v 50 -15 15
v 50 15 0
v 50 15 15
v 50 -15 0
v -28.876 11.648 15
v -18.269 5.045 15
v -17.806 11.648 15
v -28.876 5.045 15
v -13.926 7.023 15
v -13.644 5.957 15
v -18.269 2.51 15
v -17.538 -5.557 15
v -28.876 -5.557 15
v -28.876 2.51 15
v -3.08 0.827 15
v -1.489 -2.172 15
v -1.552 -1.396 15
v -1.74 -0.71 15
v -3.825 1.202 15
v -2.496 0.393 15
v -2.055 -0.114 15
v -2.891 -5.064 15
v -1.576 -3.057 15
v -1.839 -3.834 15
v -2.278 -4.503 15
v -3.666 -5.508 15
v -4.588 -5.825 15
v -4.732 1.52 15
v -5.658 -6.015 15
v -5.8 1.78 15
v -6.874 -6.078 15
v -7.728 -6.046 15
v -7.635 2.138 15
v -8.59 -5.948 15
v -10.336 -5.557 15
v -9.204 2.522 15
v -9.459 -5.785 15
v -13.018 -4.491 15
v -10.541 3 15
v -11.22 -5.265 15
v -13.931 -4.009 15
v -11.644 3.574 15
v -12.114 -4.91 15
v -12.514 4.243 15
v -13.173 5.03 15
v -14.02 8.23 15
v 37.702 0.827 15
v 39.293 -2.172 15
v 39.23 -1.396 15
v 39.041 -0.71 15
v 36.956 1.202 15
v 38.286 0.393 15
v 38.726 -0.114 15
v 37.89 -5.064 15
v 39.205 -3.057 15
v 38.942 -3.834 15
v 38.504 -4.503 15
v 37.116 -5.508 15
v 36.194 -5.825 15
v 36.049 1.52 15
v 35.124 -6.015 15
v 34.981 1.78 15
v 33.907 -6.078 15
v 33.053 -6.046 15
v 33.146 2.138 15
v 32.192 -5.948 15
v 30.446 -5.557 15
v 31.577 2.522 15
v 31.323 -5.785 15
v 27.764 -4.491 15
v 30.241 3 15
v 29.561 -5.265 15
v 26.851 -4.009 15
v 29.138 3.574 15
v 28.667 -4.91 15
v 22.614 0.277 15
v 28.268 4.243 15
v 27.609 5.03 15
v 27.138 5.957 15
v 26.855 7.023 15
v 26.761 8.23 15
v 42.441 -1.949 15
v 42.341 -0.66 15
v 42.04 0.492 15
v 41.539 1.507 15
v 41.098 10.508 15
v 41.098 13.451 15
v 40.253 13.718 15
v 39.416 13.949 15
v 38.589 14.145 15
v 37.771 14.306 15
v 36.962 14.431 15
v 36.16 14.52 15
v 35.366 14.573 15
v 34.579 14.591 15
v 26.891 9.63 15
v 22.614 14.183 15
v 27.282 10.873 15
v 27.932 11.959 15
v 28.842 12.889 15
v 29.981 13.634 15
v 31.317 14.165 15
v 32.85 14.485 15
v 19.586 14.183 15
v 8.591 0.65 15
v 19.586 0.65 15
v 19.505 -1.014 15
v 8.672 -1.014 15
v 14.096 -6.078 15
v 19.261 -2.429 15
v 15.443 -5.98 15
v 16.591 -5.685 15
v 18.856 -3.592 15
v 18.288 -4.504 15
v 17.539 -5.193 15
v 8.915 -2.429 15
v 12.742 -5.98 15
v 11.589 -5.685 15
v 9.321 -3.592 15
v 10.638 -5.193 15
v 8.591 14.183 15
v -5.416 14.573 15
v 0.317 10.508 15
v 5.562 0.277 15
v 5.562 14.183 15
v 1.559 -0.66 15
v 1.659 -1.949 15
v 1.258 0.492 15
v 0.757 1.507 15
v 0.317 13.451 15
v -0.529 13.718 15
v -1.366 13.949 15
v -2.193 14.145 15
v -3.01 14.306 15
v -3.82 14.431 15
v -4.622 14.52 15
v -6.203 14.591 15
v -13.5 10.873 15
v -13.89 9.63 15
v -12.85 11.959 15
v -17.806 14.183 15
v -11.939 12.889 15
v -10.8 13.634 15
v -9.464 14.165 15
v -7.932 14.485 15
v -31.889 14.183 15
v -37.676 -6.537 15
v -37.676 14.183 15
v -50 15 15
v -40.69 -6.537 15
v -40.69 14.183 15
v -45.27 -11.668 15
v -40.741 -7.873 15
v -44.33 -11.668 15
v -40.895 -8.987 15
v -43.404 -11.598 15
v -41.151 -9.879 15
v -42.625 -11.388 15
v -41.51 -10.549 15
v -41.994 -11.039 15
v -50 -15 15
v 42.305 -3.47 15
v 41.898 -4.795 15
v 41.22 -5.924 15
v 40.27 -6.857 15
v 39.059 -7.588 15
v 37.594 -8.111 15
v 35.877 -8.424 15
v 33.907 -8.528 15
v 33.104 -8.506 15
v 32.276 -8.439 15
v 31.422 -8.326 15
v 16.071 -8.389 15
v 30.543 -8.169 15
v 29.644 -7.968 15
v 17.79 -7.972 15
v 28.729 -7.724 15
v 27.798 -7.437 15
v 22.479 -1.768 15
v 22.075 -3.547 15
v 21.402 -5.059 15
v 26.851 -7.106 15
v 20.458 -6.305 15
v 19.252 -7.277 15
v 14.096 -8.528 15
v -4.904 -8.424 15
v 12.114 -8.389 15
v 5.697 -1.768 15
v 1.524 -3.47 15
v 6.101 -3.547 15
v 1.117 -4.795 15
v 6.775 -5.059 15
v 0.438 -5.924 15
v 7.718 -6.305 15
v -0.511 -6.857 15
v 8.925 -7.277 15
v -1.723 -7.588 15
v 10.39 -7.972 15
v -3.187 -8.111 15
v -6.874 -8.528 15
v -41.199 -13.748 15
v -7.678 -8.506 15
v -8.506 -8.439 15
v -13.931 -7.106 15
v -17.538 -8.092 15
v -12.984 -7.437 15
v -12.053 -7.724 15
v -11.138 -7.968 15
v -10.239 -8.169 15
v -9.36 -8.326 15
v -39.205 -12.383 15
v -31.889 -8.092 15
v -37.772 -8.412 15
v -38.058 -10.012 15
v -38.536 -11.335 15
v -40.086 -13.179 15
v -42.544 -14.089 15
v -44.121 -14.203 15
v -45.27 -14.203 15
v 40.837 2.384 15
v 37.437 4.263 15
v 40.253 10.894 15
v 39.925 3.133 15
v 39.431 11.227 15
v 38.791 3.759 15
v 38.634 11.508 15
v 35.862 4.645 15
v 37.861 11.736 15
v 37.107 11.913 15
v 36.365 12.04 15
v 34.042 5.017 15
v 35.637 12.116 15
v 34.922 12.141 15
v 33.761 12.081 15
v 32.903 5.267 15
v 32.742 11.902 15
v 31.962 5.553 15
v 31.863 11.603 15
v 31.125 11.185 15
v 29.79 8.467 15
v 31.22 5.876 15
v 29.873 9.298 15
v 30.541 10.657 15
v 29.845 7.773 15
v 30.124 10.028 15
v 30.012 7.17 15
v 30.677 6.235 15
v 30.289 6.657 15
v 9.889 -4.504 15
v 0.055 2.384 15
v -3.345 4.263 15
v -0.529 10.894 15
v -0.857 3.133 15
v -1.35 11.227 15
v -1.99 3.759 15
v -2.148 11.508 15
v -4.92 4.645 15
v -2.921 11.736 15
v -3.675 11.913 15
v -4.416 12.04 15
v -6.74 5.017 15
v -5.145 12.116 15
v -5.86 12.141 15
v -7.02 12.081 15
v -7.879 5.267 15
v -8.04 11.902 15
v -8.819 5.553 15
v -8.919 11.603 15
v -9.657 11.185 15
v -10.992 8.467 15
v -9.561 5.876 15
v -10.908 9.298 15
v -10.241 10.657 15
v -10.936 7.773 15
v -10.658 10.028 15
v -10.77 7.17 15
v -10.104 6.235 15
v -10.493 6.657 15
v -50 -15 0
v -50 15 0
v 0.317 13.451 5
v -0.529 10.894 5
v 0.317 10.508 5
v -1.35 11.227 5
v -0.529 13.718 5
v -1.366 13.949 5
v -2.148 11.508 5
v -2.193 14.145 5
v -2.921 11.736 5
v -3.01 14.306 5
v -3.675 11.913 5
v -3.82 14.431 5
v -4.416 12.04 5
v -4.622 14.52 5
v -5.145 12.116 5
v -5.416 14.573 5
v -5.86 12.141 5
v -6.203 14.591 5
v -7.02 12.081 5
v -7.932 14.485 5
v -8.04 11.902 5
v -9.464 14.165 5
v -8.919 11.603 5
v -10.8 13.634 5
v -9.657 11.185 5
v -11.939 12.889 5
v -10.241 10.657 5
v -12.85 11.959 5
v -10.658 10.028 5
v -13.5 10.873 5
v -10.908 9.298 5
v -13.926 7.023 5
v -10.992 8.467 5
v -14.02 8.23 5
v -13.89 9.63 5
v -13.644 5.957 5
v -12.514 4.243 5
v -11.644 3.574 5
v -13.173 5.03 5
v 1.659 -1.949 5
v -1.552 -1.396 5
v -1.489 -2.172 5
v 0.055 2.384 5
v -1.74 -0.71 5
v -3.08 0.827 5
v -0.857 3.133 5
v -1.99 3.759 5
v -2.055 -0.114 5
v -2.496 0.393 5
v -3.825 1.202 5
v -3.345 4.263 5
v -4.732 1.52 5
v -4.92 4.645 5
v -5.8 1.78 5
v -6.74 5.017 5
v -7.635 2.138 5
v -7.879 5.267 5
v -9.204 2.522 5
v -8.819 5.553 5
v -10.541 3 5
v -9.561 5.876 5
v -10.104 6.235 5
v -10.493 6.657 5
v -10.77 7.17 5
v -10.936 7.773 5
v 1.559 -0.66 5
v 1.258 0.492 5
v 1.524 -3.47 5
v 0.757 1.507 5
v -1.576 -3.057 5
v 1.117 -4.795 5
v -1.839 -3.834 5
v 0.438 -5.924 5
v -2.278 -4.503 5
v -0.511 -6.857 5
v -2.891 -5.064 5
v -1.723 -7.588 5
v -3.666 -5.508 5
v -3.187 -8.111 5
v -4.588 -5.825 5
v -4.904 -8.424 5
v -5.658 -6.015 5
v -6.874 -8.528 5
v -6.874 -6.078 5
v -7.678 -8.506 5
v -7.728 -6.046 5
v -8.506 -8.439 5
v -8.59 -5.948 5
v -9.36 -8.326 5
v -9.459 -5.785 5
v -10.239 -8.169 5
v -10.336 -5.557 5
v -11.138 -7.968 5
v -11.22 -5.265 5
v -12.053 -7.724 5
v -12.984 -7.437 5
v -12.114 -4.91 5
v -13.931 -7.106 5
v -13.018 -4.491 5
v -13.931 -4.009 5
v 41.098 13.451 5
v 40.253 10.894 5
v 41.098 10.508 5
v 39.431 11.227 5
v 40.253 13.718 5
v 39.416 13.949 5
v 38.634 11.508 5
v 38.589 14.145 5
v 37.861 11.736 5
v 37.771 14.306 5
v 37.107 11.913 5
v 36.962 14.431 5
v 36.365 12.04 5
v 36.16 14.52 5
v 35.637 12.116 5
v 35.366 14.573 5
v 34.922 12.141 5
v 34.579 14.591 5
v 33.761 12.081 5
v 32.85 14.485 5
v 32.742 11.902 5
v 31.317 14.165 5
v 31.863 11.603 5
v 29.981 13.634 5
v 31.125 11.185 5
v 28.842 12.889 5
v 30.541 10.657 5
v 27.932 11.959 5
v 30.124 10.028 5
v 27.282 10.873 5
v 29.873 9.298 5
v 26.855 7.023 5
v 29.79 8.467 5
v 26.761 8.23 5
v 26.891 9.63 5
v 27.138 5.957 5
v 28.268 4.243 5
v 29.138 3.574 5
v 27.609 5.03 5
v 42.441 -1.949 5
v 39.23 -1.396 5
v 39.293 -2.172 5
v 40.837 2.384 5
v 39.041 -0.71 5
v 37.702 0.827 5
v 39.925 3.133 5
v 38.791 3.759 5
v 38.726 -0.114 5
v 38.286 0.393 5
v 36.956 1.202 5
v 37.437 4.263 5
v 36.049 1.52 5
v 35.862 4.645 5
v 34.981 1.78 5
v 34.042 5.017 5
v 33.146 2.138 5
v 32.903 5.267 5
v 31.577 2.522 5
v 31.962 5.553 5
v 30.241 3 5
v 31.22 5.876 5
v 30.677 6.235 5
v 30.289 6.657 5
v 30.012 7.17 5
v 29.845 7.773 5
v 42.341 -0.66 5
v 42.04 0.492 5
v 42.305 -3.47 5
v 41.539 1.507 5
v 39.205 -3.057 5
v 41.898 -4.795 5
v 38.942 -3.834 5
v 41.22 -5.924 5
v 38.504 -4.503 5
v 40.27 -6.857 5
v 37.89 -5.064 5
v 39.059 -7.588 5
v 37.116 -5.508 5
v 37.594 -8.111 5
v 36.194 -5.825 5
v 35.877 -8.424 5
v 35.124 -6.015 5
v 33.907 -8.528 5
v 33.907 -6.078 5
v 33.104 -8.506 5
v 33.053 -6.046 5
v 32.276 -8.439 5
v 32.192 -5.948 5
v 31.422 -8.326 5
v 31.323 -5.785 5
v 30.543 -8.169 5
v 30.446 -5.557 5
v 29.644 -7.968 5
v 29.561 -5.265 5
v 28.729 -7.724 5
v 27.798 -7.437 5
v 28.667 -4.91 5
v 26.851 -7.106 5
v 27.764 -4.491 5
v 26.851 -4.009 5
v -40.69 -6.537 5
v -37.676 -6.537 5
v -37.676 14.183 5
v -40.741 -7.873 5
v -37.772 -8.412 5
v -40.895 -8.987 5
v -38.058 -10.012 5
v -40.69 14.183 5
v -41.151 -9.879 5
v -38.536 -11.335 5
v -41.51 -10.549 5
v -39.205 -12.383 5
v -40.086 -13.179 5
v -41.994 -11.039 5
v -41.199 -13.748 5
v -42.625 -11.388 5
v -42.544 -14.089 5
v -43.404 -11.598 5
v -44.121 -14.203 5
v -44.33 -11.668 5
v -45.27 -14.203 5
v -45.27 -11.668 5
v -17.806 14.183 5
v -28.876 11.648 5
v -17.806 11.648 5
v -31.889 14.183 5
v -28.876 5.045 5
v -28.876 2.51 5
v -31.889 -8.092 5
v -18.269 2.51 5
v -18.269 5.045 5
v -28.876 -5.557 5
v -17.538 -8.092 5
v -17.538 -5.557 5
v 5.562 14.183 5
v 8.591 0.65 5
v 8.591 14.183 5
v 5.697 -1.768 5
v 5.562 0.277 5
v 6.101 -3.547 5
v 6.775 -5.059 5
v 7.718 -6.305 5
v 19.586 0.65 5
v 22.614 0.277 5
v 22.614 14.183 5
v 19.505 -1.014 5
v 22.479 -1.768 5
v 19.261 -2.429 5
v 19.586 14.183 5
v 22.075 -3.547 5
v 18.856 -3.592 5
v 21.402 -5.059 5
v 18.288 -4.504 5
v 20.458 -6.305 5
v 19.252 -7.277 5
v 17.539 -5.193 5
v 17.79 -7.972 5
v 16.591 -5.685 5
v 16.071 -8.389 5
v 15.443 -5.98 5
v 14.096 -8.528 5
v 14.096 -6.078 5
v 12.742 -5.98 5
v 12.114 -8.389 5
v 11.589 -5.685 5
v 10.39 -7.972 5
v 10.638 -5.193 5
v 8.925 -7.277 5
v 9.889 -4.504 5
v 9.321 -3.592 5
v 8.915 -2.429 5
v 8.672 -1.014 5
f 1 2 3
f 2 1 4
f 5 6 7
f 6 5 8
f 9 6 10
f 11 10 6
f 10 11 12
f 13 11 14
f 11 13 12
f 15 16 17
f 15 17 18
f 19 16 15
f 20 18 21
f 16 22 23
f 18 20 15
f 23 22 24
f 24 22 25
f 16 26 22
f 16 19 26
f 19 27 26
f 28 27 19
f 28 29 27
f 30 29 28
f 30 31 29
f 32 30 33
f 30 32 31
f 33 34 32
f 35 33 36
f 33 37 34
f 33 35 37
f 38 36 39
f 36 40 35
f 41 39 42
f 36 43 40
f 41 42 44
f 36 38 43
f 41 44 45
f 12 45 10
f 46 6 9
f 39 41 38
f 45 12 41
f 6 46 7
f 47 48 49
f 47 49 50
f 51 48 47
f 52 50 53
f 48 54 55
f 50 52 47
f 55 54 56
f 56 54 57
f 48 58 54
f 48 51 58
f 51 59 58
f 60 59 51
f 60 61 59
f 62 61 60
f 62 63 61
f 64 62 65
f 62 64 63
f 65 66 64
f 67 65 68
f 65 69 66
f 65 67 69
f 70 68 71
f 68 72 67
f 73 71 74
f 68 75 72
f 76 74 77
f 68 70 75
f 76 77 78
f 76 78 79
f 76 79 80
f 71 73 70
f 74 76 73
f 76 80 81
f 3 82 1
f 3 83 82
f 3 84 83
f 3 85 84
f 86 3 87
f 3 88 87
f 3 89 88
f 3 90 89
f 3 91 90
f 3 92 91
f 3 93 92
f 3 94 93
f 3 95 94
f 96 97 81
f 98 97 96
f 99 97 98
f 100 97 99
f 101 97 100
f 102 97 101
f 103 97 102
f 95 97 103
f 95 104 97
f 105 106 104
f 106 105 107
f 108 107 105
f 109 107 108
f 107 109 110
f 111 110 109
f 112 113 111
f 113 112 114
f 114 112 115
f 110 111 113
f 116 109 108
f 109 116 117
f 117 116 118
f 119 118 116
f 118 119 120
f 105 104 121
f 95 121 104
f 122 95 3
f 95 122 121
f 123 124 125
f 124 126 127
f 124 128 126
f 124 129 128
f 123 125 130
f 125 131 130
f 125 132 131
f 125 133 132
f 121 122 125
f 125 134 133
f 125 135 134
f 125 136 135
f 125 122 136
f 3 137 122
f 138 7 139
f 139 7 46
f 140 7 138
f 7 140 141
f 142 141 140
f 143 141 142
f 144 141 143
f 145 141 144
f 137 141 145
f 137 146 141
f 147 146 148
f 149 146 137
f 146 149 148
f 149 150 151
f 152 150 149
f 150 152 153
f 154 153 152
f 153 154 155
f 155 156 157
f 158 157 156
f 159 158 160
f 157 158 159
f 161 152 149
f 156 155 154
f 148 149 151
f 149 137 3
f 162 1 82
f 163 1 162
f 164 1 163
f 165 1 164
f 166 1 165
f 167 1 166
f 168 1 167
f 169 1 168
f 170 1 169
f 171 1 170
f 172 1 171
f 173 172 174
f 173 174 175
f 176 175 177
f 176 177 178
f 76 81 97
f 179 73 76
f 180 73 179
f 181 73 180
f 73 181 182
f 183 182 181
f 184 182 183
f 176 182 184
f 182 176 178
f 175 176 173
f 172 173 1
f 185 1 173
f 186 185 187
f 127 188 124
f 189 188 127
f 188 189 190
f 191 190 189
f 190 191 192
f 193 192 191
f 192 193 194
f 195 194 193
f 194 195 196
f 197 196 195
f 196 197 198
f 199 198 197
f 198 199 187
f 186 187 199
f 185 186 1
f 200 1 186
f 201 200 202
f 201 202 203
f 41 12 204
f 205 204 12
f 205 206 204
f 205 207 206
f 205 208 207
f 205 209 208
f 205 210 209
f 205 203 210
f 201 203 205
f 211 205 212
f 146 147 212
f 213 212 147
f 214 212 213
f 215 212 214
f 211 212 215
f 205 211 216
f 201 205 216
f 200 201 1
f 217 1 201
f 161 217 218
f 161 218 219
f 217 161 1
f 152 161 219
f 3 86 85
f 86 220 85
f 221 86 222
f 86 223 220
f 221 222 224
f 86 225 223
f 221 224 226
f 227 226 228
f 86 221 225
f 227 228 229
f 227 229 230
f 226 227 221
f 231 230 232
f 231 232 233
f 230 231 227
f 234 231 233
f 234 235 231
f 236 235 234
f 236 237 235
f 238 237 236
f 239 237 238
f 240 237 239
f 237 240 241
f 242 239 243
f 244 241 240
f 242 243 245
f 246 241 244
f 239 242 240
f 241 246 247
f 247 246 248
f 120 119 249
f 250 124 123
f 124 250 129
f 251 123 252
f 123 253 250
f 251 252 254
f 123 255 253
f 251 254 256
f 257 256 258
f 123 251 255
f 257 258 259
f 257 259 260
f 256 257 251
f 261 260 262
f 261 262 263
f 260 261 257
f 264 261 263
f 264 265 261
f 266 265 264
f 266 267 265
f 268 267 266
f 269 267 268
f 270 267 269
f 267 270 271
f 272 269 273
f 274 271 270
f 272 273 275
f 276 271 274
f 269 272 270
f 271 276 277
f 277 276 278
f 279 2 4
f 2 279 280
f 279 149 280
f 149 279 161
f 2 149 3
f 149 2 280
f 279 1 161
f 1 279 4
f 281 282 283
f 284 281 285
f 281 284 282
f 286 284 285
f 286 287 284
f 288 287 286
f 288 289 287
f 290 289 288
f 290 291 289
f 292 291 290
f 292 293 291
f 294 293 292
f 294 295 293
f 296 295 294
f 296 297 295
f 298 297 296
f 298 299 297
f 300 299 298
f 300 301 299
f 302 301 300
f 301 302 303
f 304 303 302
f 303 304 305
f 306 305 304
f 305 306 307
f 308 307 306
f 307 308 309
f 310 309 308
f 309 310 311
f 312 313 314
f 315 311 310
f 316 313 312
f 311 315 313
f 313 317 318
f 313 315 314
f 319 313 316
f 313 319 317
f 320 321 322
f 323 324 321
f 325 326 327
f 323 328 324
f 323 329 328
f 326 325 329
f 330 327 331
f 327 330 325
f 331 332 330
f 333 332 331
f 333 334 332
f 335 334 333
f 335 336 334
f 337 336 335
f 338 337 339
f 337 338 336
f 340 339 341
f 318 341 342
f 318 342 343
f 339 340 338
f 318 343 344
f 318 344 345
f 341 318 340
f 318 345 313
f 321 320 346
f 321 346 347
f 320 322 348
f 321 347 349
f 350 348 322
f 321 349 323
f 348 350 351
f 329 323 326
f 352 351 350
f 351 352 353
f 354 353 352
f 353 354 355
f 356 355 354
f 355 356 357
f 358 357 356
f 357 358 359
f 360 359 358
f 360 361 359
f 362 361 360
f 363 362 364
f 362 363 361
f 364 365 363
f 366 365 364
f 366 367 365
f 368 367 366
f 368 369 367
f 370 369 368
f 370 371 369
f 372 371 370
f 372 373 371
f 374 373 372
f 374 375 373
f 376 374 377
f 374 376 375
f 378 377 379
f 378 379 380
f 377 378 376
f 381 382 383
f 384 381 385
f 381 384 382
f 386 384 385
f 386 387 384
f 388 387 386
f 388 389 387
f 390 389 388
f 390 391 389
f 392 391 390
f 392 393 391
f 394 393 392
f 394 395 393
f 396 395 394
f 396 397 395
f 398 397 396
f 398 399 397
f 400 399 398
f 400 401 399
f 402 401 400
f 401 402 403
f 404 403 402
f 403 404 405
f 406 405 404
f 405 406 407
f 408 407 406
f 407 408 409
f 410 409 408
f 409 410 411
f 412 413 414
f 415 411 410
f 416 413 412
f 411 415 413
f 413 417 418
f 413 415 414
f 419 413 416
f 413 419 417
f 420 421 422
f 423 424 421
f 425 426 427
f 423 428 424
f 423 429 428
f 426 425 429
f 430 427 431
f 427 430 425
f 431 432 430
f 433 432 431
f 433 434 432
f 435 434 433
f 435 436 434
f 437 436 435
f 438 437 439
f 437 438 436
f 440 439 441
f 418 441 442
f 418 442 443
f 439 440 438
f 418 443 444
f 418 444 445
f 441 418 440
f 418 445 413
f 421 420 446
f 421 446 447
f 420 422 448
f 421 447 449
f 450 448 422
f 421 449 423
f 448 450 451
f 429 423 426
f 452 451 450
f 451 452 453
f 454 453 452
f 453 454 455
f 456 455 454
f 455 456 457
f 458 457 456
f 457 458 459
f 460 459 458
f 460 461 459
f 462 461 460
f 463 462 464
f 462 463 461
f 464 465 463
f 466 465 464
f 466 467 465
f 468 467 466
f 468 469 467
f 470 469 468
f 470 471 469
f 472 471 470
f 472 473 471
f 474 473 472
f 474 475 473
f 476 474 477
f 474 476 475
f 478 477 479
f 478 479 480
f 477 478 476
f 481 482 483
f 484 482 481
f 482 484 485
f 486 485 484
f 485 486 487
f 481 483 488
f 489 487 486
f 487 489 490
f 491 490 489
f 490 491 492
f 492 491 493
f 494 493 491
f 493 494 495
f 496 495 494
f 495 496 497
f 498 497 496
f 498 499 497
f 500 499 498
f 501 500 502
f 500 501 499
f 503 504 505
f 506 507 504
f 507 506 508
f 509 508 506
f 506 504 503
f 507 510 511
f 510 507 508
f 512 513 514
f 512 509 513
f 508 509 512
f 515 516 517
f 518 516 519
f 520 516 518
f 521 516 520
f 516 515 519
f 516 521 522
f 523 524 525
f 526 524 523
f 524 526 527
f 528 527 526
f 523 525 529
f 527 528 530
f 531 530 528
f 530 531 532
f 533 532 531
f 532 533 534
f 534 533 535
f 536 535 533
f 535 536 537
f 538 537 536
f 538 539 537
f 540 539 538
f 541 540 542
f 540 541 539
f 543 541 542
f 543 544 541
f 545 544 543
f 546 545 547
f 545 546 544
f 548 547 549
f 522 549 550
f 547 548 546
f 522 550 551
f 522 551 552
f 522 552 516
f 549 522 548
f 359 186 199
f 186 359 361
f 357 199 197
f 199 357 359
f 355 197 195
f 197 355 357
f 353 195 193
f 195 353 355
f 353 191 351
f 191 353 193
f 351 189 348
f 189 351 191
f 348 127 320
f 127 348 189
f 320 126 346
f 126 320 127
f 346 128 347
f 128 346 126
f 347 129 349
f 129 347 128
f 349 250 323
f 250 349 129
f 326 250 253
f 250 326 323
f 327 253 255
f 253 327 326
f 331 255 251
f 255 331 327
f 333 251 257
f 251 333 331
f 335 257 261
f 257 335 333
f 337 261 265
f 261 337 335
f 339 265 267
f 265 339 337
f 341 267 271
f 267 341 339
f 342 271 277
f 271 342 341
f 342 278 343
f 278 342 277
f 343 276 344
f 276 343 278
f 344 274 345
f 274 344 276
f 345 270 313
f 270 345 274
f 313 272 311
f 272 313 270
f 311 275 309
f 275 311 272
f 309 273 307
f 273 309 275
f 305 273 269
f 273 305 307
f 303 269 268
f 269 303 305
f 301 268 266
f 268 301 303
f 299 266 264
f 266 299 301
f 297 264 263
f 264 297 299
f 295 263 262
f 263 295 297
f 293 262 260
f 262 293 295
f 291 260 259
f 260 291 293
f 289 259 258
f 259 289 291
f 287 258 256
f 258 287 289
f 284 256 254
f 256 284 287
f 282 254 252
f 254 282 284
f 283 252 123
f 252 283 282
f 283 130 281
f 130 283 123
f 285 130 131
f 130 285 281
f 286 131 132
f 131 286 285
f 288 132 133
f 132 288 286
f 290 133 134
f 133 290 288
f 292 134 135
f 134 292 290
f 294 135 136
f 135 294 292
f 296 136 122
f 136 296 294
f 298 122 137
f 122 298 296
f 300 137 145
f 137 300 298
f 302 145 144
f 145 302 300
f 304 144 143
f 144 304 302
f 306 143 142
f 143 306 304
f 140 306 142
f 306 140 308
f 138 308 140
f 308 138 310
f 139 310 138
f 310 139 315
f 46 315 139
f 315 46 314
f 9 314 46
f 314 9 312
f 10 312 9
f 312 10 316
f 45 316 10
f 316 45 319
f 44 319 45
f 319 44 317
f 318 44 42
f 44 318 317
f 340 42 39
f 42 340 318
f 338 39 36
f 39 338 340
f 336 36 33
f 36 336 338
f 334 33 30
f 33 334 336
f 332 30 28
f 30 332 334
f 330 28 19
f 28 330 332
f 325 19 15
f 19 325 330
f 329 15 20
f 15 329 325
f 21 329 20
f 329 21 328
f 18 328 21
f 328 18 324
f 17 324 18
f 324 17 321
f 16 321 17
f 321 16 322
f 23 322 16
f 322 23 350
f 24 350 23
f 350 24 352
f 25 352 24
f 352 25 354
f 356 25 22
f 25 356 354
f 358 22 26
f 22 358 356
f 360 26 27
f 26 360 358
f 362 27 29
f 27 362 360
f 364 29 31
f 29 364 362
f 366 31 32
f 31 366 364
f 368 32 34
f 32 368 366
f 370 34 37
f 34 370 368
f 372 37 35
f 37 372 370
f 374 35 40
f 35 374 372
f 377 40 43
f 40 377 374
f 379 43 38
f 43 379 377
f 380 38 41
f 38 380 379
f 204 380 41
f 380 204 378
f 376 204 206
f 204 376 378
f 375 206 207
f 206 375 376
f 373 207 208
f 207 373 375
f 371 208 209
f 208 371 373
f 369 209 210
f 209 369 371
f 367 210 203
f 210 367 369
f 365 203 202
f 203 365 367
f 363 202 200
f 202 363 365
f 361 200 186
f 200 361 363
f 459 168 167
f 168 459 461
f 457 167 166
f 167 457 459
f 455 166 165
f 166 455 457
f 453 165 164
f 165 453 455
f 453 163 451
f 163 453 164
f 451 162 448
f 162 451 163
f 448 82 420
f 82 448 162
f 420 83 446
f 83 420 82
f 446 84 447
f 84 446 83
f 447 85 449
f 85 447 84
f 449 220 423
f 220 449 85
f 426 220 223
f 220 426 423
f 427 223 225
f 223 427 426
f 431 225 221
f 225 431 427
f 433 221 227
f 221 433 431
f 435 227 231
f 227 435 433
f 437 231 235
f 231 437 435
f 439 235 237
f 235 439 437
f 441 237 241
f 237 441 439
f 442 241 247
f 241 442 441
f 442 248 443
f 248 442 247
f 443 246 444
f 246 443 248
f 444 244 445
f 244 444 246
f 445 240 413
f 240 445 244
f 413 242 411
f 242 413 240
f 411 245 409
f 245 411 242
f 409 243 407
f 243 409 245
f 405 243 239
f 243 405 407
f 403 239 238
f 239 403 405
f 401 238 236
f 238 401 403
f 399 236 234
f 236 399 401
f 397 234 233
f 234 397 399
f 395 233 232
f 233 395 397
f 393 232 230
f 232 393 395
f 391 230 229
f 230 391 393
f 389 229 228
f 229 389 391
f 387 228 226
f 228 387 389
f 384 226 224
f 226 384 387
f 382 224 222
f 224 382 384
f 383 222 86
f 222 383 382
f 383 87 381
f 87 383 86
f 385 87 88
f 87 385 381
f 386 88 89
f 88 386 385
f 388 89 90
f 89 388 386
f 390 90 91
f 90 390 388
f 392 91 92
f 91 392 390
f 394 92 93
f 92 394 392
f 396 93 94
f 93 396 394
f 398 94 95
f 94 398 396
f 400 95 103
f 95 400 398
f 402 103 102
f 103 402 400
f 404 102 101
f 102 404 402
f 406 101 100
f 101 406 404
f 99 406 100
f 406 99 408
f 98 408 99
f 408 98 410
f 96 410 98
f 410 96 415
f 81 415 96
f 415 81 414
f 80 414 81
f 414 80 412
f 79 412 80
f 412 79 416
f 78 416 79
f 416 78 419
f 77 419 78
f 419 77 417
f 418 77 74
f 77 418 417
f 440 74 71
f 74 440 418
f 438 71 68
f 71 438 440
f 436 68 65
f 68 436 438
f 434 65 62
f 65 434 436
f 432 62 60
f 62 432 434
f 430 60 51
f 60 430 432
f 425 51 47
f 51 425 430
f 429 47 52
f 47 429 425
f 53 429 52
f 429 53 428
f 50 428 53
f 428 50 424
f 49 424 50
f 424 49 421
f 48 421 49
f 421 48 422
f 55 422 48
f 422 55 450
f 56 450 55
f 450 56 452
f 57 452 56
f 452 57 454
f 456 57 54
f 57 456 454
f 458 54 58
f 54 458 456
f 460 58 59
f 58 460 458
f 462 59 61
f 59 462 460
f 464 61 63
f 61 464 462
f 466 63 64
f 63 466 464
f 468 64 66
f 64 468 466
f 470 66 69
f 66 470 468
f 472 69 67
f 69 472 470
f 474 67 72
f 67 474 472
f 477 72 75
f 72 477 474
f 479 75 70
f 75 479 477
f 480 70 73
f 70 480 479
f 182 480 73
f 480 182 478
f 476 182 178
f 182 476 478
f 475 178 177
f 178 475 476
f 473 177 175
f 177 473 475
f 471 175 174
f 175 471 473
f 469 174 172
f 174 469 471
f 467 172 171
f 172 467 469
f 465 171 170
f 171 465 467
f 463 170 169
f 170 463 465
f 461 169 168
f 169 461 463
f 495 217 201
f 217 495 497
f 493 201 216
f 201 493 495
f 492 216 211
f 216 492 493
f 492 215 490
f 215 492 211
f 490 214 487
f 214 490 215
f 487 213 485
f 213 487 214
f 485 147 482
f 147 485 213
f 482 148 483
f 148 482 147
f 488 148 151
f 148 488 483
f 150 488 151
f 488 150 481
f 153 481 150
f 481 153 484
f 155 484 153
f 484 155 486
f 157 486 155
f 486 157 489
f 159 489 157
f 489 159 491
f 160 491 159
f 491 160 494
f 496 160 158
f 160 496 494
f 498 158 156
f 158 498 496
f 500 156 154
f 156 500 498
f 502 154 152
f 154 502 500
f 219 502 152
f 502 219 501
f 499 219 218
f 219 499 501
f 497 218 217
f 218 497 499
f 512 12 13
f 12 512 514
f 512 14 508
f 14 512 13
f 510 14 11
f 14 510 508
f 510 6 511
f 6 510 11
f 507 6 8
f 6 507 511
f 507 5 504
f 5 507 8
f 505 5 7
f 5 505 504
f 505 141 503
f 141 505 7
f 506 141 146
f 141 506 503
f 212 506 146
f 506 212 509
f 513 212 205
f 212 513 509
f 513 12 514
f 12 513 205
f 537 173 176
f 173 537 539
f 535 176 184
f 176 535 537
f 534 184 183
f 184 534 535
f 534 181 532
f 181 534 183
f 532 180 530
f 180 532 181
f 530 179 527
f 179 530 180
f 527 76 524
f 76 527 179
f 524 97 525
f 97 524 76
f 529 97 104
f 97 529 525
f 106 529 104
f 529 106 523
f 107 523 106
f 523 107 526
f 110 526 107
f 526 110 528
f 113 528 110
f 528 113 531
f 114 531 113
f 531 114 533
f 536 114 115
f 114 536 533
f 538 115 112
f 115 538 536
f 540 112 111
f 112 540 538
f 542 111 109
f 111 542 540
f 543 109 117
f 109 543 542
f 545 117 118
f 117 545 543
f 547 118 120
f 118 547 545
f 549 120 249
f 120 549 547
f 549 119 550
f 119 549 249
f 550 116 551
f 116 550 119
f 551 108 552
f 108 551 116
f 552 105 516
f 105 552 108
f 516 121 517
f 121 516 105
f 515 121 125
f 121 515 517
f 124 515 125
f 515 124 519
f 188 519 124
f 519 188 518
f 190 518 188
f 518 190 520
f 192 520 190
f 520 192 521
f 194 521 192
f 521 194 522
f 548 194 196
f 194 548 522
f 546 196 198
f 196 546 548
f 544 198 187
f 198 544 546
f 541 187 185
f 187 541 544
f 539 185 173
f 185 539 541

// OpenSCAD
// LetterBlock.scad - Basic usage of text() and linear_extrude()

// Module instantiation
LetterBlock("JESUS",30,100);

// Module definition.
// size=30 defines an optional parameter with a default value.
module LetterBlock(letter, height=30,width=0,depth=0) {
    width = width==0 ? height : width;
    depth = depth==0 ? height/2 : depth;
    size=height;
    difference() {
        translate([0,0,size/4]) cube([width,height,depth], center=true);
        translate([0,0,size/6]) {
            // convexity is needed for correct preview
            // since characters can be highly concave
            linear_extrude(height=size, convexity=4)
                text(letter, 
                     size=size*22/30,
                     font="Bitstream Vera Sans",
                     halign="center",
                     valign="center");
        }
    }
}

echo(version=version());
// Written by Marius Kintel <marius@kintel.net>
//
// To the extent possible under law, the author(s) have dedicated all
// copyright and related and neighboring rights to this software to the
// public domain worldwide. This software is distributed without any
// warranty.
//
// You should have received a copy of the CC0 Public Domain
// Dedication along with this software.
// If not, see <http://creativecommons.org/publicdomain/zero/1.0/>.
